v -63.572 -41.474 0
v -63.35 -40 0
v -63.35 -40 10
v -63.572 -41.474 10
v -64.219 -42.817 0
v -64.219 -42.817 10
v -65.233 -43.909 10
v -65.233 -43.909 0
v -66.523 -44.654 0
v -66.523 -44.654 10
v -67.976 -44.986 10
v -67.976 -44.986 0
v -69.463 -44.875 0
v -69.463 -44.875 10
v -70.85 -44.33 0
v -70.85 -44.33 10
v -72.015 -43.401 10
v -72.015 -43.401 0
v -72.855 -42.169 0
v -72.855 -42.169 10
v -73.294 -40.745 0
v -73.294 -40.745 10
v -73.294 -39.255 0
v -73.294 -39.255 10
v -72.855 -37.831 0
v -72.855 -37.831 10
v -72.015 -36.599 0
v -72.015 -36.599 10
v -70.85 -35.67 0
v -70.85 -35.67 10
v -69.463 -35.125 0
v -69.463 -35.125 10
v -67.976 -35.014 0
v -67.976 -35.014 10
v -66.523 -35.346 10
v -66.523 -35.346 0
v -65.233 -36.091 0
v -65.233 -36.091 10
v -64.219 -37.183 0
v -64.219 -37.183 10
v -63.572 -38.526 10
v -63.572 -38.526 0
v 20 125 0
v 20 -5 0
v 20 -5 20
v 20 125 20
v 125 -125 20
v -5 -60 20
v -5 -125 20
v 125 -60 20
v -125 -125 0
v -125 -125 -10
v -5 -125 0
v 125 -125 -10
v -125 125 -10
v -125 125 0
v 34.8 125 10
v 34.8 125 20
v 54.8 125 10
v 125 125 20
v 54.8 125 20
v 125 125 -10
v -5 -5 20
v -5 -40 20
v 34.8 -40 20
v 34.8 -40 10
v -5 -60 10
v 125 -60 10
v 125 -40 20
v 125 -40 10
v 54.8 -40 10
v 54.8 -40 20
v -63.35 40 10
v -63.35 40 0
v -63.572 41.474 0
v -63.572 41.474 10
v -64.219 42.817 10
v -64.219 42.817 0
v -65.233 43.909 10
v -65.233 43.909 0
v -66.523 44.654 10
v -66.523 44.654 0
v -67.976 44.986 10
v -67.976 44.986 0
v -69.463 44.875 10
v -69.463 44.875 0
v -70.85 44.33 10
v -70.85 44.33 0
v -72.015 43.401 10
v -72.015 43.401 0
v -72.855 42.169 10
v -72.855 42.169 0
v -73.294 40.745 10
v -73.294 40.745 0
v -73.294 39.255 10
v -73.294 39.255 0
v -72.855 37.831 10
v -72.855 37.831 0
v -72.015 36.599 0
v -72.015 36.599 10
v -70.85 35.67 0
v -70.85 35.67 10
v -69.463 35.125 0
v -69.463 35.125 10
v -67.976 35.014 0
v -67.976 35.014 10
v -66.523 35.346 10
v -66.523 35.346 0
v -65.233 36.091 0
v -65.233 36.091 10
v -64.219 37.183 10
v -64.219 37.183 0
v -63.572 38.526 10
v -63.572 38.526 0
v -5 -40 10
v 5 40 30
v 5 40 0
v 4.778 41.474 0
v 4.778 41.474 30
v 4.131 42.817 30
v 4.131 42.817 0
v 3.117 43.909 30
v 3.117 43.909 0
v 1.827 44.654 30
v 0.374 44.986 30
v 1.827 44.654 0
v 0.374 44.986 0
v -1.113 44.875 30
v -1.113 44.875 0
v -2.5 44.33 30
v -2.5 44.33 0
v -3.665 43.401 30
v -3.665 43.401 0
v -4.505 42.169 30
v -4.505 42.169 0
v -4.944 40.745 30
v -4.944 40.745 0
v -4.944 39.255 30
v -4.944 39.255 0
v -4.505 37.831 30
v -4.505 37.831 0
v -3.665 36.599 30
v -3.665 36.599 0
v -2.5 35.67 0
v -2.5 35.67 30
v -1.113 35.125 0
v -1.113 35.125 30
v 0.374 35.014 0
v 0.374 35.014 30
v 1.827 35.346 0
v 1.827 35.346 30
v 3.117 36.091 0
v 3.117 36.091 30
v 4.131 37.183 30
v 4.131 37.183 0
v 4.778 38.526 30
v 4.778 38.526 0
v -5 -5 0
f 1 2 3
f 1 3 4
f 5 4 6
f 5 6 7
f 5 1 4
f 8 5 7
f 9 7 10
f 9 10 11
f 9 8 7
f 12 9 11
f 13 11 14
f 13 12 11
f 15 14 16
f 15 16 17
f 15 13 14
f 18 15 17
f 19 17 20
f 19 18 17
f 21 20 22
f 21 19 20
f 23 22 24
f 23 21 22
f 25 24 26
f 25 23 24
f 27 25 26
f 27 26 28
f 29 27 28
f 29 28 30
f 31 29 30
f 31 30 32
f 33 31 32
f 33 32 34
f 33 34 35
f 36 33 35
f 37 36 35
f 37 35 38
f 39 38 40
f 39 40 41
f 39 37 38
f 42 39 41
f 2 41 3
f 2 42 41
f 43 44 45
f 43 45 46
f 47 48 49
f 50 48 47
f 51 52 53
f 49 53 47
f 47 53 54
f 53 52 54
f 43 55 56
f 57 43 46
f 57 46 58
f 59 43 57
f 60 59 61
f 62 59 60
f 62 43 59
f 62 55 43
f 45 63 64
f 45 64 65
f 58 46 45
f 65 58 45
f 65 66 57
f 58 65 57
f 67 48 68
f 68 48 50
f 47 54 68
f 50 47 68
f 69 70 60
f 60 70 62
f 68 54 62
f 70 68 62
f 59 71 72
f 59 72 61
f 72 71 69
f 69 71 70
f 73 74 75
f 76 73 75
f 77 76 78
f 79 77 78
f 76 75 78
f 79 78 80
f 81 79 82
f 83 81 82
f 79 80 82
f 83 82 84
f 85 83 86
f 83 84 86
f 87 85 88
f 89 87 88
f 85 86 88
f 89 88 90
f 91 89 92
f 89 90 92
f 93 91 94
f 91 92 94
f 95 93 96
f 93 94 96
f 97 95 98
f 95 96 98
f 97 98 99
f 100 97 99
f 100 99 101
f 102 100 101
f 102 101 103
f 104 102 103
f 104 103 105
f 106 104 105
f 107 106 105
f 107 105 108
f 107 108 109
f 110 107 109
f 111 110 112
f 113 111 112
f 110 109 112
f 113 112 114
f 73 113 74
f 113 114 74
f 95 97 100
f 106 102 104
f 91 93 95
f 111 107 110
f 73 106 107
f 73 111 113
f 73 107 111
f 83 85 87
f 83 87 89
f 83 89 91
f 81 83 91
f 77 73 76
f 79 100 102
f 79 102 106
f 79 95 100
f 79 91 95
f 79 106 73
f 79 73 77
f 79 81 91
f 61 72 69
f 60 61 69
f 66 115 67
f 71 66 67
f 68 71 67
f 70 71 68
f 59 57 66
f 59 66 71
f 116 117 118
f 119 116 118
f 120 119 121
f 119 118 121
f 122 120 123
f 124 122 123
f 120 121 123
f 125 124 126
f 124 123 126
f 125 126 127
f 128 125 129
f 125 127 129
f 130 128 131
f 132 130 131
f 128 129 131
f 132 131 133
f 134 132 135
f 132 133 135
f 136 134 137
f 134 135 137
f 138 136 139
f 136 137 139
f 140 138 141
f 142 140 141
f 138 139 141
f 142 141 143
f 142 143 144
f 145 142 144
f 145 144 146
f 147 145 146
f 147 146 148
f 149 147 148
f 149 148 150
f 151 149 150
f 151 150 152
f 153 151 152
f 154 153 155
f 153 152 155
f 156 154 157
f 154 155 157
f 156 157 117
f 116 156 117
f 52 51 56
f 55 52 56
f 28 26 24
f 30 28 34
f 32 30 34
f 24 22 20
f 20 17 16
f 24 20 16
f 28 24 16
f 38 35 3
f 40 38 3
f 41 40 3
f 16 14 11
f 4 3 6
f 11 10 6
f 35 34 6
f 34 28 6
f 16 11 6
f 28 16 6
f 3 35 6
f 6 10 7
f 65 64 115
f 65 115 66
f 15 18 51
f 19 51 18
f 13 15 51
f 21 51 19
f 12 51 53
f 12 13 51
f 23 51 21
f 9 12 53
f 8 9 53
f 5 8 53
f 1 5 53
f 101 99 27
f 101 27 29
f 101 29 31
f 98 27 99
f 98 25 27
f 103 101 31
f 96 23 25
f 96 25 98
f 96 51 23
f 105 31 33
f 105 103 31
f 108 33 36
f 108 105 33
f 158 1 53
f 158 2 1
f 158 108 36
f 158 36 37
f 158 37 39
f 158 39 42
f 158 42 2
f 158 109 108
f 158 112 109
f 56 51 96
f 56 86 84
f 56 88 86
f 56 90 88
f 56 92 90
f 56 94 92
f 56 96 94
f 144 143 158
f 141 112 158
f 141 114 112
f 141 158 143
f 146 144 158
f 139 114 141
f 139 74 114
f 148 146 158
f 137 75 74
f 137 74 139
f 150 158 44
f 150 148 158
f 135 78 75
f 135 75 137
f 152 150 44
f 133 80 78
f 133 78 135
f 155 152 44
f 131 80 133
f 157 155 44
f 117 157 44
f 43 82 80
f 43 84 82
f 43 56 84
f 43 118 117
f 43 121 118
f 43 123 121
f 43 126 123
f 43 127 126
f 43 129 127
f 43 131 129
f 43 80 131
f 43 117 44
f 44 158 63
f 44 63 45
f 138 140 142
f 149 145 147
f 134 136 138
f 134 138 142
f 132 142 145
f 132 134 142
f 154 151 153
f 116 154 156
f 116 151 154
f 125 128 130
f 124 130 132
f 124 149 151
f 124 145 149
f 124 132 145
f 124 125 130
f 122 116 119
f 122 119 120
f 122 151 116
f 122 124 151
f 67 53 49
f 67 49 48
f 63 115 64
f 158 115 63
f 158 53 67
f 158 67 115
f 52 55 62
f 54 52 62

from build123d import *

# Parameters (mm, degrees)
SKETCH_1_W          = 250
SKETCH_1_H          = 250
EXTRUDE_1_DEPTH     = 10
SKETCH_2_R          = 5
EXTRUDE_2_DEPTH     = 10
SKETCH_3_R          = 5
EXTRUDE_3_DEPTH     = 30
SKETCH_4_W          = 14.8
SKETCH_4_H          = 165
EXTRUDE_4_DEPTH     = 20
SKETCH_5_W          = 100
SKETCH_5_H          = 65
EXTRUDE_5_DEPTH     = 20
SKETCH_6_W          = 100
SKETCH_6_H          = 250
EXTRUDE_6_DEPTH     = 10
SKETCH_7_W          = 70.2
SKETCH_7_H          = 165
EXTRUDE_7_DEPTH     = 10
SKETCH_8_W          = 30
SKETCH_8_H          = 120
EXTRUDE_8_DEPTH     = 20
SKETCH_9_W          = 30
SKETCH_9_H          = 20
CUT_EXTRUDE_1_DEPTH = 10


with BuildPart() as part:
    # 草图1 → 凸台-拉伸1 (new body)
    with BuildSketch(Plane.XY):
        Rectangle(SKETCH_1_W, SKETCH_1_H)
    extrude(amount=-EXTRUDE_1_DEPTH)

    # 草图2 → 凸台-拉伸2 (add)
    with BuildSketch(Plane.XY):
        with Locations((-68.35, 40)):
            Circle(SKETCH_2_R)
    extrude_2 = extrude(amount=EXTRUDE_2_DEPTH)

    # 镜向1: 凸台-拉伸2 across plane
    add(extrude_2.mirror(Plane.ZX))

    # 草图3 → 凸台-拉伸3 (add)
    with BuildSketch(Plane.XY):
        with Locations((0, 40)):
            Circle(SKETCH_3_R)
    extrude(amount=EXTRUDE_3_DEPTH)

    # 草图4 → 凸台-拉伸4 (add)
    with BuildSketch(Plane.XY):
        with Locations((27.4, 42.5)):
            Rectangle(SKETCH_4_W, SKETCH_4_H)
    extrude(amount=EXTRUDE_4_DEPTH)

    # 草图5 → 凸台-拉伸5 (add)
    with BuildSketch(Plane.XY):
        with Locations((75, -92.5)):
            Rectangle(SKETCH_5_W, SKETCH_5_H)
    extrude(amount=EXTRUDE_5_DEPTH)

    # 草图6 → 凸台-拉伸6 (add)
    with BuildSketch(Plane.XY):
        with Locations((75, 0)):
            Rectangle(SKETCH_6_W, SKETCH_6_H)
    extrude(amount=EXTRUDE_6_DEPTH)

    # 草图7 → 凸台-拉伸7 (add)
    with BuildSketch(Plane.XY.offset(10)):
        with Locations((89.9, 42.5)):
            Rectangle(SKETCH_7_W, SKETCH_7_H)
    extrude(amount=EXTRUDE_7_DEPTH)

    # 草图8 → 凸台-拉伸8 (add)
    with BuildSketch(Plane.XY):
        with Locations((10, -65)):
            Rectangle(SKETCH_8_W, SKETCH_8_H)
    extrude(amount=EXTRUDE_8_DEPTH)

    # 草图9 → 切除-拉伸1 (cut)
    with BuildSketch(Plane.XY.offset(20)):
        with Locations((10, -50)):
            Rectangle(SKETCH_9_W, SKETCH_9_H)
    extrude(amount=-CUT_EXTRUDE_1_DEPTH, mode=Mode.SUBTRACT)


solid = part.part
